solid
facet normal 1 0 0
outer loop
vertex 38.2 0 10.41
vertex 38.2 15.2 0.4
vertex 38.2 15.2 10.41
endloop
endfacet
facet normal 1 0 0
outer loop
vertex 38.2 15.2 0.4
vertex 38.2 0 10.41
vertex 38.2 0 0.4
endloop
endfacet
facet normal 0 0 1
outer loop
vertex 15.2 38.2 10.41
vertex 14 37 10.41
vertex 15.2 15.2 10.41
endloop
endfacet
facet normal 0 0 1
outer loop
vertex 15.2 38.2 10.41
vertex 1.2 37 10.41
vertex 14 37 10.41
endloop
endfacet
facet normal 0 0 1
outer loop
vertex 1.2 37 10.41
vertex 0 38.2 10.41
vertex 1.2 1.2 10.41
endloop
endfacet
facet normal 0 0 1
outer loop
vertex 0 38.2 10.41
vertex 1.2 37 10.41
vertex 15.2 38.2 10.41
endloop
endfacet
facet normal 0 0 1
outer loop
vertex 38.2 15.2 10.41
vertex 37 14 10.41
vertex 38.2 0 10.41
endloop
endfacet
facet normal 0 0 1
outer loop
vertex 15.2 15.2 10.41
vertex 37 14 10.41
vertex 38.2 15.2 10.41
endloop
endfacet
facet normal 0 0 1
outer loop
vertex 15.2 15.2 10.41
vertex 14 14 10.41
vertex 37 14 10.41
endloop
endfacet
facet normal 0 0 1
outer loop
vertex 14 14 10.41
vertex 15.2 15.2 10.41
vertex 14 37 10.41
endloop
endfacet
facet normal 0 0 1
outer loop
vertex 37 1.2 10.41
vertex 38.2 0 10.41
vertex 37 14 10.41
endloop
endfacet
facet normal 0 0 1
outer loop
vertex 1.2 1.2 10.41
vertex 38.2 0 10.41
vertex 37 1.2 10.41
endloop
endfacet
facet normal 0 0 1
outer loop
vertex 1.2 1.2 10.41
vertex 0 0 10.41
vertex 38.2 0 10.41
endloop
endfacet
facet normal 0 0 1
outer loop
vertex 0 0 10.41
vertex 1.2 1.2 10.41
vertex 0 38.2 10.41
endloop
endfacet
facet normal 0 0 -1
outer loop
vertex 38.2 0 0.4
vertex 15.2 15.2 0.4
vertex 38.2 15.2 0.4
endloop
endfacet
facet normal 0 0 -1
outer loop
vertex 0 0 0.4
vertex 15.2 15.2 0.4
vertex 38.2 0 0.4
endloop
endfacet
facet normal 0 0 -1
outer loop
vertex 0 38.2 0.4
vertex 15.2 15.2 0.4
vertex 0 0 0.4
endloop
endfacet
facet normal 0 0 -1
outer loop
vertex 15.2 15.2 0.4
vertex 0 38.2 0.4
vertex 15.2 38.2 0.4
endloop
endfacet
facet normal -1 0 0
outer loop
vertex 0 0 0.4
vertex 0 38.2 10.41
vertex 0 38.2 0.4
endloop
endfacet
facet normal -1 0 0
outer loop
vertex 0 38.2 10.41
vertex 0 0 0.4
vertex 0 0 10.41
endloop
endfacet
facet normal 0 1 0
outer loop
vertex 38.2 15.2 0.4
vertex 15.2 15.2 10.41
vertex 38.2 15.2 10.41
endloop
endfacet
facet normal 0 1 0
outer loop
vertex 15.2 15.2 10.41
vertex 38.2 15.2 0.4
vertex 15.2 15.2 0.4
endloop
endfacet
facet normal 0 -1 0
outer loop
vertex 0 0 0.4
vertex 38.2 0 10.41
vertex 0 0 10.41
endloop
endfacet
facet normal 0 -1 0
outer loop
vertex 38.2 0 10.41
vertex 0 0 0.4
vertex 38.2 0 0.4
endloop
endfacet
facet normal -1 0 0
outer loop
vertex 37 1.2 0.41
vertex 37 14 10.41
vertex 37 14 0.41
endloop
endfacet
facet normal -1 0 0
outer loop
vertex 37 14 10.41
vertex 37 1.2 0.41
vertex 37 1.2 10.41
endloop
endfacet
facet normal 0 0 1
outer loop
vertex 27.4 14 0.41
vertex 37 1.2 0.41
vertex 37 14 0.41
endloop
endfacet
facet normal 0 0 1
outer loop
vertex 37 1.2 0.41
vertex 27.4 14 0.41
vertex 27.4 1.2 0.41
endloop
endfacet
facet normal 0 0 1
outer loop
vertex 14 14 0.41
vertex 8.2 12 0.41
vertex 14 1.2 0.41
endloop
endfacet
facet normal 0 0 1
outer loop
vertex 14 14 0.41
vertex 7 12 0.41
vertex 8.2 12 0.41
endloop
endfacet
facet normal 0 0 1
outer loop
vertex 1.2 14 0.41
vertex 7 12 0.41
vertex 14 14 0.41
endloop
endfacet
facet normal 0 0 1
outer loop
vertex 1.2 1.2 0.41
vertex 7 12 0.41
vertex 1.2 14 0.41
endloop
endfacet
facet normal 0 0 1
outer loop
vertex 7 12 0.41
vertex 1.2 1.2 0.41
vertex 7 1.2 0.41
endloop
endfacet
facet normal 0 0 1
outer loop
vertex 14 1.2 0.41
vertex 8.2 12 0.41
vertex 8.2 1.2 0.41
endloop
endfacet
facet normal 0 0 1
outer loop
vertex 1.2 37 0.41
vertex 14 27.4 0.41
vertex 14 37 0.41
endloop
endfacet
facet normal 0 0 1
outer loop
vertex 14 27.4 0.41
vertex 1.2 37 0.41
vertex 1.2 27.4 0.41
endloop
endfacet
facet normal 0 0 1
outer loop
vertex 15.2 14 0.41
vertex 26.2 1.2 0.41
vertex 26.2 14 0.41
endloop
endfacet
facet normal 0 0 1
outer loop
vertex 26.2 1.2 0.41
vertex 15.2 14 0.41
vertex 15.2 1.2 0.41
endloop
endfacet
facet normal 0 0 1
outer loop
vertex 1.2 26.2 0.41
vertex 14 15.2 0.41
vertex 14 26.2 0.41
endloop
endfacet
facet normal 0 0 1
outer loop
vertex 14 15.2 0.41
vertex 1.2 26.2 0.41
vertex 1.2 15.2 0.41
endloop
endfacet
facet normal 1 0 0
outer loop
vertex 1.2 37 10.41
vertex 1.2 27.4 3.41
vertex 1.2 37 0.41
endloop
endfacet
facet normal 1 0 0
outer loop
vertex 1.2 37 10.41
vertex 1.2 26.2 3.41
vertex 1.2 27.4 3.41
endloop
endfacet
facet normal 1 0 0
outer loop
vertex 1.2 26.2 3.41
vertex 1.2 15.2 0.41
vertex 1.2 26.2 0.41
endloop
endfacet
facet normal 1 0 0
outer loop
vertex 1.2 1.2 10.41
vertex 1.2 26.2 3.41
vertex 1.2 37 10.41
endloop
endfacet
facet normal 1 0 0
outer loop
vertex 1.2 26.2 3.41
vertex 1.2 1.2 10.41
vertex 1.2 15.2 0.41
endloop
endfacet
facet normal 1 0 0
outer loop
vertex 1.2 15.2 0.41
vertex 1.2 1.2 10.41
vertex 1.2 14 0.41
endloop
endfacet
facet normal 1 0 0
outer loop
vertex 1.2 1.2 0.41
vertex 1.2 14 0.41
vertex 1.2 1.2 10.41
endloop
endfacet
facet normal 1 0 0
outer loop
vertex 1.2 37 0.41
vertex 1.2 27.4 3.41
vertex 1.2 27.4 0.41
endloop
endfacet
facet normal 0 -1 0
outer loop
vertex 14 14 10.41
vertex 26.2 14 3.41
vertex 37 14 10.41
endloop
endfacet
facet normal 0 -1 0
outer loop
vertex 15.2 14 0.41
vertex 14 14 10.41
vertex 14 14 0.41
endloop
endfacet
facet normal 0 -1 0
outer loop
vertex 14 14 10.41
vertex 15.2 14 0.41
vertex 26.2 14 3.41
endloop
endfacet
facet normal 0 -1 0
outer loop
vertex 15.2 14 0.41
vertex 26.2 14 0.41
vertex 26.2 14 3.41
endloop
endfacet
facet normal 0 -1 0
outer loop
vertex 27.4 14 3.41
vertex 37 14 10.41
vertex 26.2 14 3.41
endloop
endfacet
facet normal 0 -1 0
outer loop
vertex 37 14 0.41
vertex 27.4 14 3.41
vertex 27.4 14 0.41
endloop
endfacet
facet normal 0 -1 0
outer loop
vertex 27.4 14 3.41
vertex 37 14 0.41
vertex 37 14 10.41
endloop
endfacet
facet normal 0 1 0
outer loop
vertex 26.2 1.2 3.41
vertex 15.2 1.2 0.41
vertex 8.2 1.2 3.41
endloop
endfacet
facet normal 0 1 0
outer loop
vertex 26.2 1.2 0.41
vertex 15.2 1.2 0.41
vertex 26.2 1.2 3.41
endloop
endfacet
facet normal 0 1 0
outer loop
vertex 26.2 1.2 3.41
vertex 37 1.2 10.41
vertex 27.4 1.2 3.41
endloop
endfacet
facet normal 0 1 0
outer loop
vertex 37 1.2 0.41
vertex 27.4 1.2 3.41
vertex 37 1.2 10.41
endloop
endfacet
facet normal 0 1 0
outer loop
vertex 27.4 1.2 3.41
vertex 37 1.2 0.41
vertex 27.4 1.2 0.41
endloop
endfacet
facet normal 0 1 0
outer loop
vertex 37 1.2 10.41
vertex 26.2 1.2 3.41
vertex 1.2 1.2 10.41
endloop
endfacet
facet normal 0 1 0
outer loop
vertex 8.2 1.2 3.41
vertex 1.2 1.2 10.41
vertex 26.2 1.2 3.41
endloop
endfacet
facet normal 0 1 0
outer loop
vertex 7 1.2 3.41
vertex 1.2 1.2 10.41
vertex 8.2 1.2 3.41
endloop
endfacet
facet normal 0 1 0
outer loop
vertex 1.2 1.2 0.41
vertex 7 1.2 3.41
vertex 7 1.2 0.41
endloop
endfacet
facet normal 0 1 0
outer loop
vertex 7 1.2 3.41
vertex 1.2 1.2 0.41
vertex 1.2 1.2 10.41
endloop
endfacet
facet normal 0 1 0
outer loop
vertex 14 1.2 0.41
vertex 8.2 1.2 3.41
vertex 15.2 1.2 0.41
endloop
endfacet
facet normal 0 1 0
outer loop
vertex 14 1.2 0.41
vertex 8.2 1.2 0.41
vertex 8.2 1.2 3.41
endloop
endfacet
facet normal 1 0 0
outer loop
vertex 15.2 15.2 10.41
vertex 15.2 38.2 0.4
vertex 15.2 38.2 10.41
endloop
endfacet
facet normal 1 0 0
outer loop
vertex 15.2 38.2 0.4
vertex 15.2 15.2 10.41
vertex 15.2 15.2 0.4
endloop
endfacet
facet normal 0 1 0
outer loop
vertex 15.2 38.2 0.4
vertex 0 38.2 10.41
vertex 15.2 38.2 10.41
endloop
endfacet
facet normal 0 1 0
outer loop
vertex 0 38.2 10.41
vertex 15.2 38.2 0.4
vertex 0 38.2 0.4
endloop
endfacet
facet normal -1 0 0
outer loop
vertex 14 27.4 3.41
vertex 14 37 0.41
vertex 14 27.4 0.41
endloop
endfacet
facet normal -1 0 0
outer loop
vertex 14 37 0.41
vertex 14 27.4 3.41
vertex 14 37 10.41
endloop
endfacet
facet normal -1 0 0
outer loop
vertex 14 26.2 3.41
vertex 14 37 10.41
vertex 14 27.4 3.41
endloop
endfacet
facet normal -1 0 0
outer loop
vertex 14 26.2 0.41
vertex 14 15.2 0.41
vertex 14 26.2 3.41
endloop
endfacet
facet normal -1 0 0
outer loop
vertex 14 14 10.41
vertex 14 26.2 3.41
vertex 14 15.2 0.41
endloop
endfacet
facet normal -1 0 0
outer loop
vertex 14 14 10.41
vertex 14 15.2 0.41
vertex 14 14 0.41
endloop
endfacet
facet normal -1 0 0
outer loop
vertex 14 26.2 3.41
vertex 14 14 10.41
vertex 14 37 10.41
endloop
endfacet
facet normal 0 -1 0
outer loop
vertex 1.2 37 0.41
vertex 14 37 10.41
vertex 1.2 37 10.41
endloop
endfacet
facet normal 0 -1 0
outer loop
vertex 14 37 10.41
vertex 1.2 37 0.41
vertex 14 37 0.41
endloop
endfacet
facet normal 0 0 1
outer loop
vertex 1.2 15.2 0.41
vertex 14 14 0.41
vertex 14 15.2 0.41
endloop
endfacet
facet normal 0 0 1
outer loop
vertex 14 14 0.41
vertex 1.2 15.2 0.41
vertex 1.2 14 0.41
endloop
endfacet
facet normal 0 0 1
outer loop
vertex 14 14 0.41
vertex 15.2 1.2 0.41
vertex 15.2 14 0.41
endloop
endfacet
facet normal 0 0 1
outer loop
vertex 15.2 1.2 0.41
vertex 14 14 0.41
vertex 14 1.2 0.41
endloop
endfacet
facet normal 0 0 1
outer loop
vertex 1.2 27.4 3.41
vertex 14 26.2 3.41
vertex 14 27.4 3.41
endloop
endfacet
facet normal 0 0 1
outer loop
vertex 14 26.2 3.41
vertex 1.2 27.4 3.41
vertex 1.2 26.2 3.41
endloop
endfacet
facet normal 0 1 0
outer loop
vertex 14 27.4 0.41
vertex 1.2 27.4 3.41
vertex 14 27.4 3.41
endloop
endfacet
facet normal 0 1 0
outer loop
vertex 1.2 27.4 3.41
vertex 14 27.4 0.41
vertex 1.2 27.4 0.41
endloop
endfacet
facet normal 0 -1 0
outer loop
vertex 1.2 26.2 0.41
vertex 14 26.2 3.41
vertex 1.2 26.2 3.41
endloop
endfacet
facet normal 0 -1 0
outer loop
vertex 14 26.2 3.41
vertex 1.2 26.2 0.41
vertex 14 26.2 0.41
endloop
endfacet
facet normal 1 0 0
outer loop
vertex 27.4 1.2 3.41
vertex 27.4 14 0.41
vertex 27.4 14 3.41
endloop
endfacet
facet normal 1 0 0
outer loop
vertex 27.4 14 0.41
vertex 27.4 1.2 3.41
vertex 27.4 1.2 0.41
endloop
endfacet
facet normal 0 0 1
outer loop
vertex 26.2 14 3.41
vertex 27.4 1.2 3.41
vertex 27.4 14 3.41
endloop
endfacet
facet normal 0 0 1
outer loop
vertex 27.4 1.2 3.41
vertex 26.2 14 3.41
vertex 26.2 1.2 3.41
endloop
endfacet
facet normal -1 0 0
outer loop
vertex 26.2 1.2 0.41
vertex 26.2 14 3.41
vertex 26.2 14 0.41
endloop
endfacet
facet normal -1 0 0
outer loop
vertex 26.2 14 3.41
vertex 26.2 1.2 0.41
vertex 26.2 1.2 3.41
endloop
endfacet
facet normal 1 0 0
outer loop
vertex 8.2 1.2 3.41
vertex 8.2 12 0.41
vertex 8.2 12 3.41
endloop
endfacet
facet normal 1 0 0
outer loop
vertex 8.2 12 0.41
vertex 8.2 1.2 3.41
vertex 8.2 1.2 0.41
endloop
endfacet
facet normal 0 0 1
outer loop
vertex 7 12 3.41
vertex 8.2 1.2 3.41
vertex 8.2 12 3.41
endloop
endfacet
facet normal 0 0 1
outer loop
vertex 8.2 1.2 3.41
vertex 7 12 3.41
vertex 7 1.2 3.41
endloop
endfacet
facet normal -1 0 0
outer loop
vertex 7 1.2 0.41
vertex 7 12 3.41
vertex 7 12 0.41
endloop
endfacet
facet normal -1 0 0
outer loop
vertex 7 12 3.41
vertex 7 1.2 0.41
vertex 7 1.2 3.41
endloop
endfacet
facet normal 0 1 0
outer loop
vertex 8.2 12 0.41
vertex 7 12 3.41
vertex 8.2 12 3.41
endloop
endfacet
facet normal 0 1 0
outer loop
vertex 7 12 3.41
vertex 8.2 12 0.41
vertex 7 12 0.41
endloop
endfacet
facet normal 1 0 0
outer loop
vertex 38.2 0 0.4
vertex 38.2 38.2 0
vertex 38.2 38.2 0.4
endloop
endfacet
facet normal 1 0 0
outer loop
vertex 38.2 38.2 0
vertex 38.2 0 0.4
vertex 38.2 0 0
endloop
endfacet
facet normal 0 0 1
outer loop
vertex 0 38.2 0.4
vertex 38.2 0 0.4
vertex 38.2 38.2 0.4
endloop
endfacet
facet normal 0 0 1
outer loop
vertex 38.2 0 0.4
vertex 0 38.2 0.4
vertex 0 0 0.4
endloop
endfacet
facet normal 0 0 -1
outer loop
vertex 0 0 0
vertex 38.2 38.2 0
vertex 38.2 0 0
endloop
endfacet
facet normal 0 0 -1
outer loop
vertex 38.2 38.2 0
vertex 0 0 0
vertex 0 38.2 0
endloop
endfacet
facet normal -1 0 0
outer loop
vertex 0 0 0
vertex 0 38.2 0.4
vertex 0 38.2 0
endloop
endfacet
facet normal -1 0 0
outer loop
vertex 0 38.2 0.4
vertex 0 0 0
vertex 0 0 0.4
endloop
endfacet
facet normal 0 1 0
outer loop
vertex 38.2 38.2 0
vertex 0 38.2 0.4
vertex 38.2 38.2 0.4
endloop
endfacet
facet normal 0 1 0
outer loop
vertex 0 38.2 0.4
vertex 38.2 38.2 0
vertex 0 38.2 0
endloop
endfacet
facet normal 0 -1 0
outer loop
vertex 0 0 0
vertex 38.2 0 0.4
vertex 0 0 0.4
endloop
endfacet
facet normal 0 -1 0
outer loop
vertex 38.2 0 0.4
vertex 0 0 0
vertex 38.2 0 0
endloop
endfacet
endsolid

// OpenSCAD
// file: ../../Base/PlacementOptions.scad
// Fischertechnik Box Foundation
// Placement Options

// Alignment
NoAlign = 0;
AlignLeft = 1;
AlignBottom = 2;
AlignCenter = 3;
AlignRight = 4;
AlignTop = 5;

// Element rotation degree steps
rotations = [0, -90, -180, -270];

// Rotation
NoRotation = 0;
Rotate0 = 0;
Rotate90 = 1;
Rotate180 = 2;
Rotate270 = 3;

// Docking (seen from above)
NoDock = -1;
DockLeft = 0;
DockTop = 1;
DockRight = 2;
DockCorner = 2;
DockBottom = 3;

// Web corners
LowerLeft = 0;
UpperLeft = 1;
UpperRight = 2;
LowerRight = 3;

// Web position relative to corner
LeftOfCorner = 0;
RightOfCorner = 1;
// file: ../../Base/Boxes.scad
// Fischertechnik Box Foundation
// Pre-designed Boxes

use <Constants.scad>

include <PlacementOptions.scad>

box190Width = 190;
box190Depth = 130;
box130Width = 130;
box130Depth = 95;
boxUsageHeight = 33.9;
boxWallThickness = 2.4;
boxBaseThickness = 1.0;
boxWebWidth = 3.0;

// getBoxWallThickness()
// Gets the wall thickness of a Fischertechnik Box

function getBoxWallThickness() = boxWallThickness;

// Gets the usable height of a fischertechnik box
function getBoxUsageHeight() = boxUsageHeight;

// Gets the thickness of the Fischertechnik box base.
function getBoxBaseThickness() = boxBaseThickness;

// Gets the width of a box web
function getBoxWebWidth() = boxWebWidth;

// Gets the usable inner space of a Box 190 as an x/y-list
function getBox190Space() = [
    box190Width - 2*getBoxWallThickness(), 
    box190Depth - 2*getBoxWallThickness() ];

// Imports the Fischertechnik empty box 130x190 mm and places it at position 0,0
// 190x130 are the outer sizes, the inner space is slightly smaller. Use getBox190Space() to get the inner sizes.
// This module needs the STL file "Fischertechnik Box 130x190.stl" in the library path.
// The box is positioned that the usable inner space is at the 0,0,0 position. The

module Box190() {
    translate([-getBoxWallThickness(),-getBoxWallThickness(),-getBoxBaseThickness()])
        import("Fischertechnik Box 130x190.stl", convexity=3);
}

// Gets the usable inner space of a Box 130 as an x/y-list
function getBox130Space() = [
    box130Width - 2*getBoxWallThickness(), 
    box130Depth - 2*getBoxWallThickness() ];

// Imports the Fischertechnik empty box 95x130 mm and places it at position 0,0
// 190x130 are the outer sizes, the inner space is slightly smaller. Use getBox190Space() to get the inner sizes.
// This module needs the STL file "Fischertechnik Box 95x130.stl" in the library path.
// The box is positioned that the usable inner space is at the 0,0,0 position. The

module Box130() {
    translate([-getBoxWallThickness(),-getBoxWallThickness(),-getBoxBaseThickness()])
        import("Fischertechnik Box 95x130.stl", convexity=3);
}

// Creates a web at the specified box walls
// corner 0 = LowerLeft, 1 = UpperLeft, 2 = UpperRight, 3 = LowerRight
// side 0 = LeftOfCorner, 1 = RightOfCorner
// distance = Distance in mm from the corner
// box = inner width and depth of the box (default: Box 190)
// webWidth = length of the web (default is 3 mms)
// webThickness = thickness of the web (default is 1 mm)

module BoxWeb(corner, side, distance, box=getBox190Space(), webWidth=getBoxWebWidth(), webThickness=1.0) {
    sink = getBoxWallThickness()/2;

    width = (corner % 2 == 0) ? 
            (side == LeftOfCorner ? webWidth : webThickness) :
            (side == LeftOfCorner ? webThickness : webWidth);

    depth = (corner % 2 == 0) ? 
            (side == RightOfCorner ? webWidth : webThickness) :
            (side == RightOfCorner ? webThickness : webWidth);
    
    xDiff = corner == LowerLeft ? 
                (side == LeftOfCorner ? -sink : distance) :
            (corner == UpperLeft ?                
                (side == LeftOfCorner ? distance : -sink) :
            (corner == UpperRight ?
                (side == LeftOfCorner ? box.x-webWidth+sink : box.x-distance-webThickness) :
                (side == LeftOfCorner ? box.x-distance-webThickness: box.x-webWidth+sink)));

    yDiff = corner == LowerLeft ? 
                (side == RightOfCorner ? -sink : distance) :
            (corner == UpperLeft ?
                (side == RightOfCorner ? box.y-distance : box.y-webWidth+sink) :
            (corner == UpperRight ?
                (side == RightOfCorner ? box.y-webWidth+sink : box.y-distance) :
                (side == RightOfCorner ? distance : -sink)));
    
    translate([xDiff, yDiff, -getExcess()])
        cube([width, depth, boxUsageHeight + 2*getExcess()]);
}
// file: ../../Base/Rotation.scad
// Fischertechnik Box Foundation
// Geometry Helpers Rotation

include <PlacementOptions.scad>

// getRotatedSpace(space, rotation=NoRotation)
// Rotates the space dependent on the specified rotation

function getRotatedSpace(space, rotation=NoRotation) = [
    (rotation == Rotate90 || rotation == Rotate270) ? space.y : space.x,
    (rotation == Rotate90 || rotation == Rotate270) ? space.x : space.y
];

// Rotates the given space around the fixed left lower corner
// space = the space the children needs as width/depth list [width,depth]
// rotation = 0 Rotate0 degrees, 1 Rotate90 degrees, 2 Rotate180 degrees, 3 Rotate270 degrees (equivalent to -90)

module RotateFix(space, rotation=Rotate0) {
    dy = (rotation == Rotate0 || rotation == Rotate270) ? 0 :
        (rotation == Rotate90) ? space.x :
        space.y;
    dx = (rotation < Rotate180) ? 0 :
        (rotation == Rotate180) ? space.x :
        space.y;
    
    translate([dx, dy, 0])
        rotate([0, 0, rotations[rotation]])
            children();
}
// file: ../../Base/Alignment.scad
// Fischertechnik Box Foundation
// Geometry Helpers Alignment

include <PlacementOptions.scad>

// getAlignedX(elementWidth, spaceWidth, align=AlignRight, offset=0)
// Gets the aligned X offset of an element with the given
// width in the given space.
// elementWidth = The width of the element to positon
// spaceWidth = The space where the element should be aligned
// align = 0 AlignLeft, 1 AlignCenter, 2 AlignRight
// offset = an optional offset from the aligned position. When
// aligned left or centered, then positive values are in X direction.
// When aligned right then positive values are in negative X direction.

function getAlignedX(elementWidth, spaceWidth, align=AlignRight, offset=0) =
    (align == AlignLeft) ?
        offset :
        ((align == AlignCenter) ?
        (spaceWidth - elementWidth)/2 + offset :
        spaceWidth - offset - elementWidth);

// getAlignedY(elementDepth, spaceDepth, align=AlignTop, offset=0)
// Gets the aligned Y offset of an element with the given
// depth in the given space.
// elementDepth = The depth of the element to positon
// spaceDepth = The space where the element should be aligned
// align = 0 AlignBottom, 1 AlignCenter, 2 AlignTop
// offset = an optional offset from the aligned position. When
// aligned bottom or centered, then positive values are in Y direction.
// When aligned top then positive values are in negative Y direction.

function getAlignedY(elementDepth, spaceDepth, align=AlignTop, offset=0) =
    (align == AlignBottom) ?
        offset :
        ((align == AlignCenter) ?
        (spaceDepth - elementDepth)/2 + offset :
        spaceDepth - offset - elementDepth);
// file: ../../Base/Placement.scad
// Fischertechnik Box Foundation
// Geometry Helpers Placement

use <Constants.scad>
use <Alignment.scad>
use <Rotation.scad>
use <Boxes.scad>

include <PlacementOptions.scad>

// Place(x=0, y=0, elementSpace=[0,0], alignX=AlignLeft, alignY=AlignBottom, rotation=Rotate0, boxSpace=getBox190Space())
// Places the child at the specified position
// y = Y-Position. This is a relative position when an X aligment is specified.
// x = X-Position. This is a relative position when an Y aligment is specified.
// elementSpace = space of the element to be placed [x,y]
// alignX = -1=NoAlign, 0 AlignLeft, 1 AlignCenter, 3 AlignRight (elementSpace and boxSpace required!)
// alignY = -1=NoAlign, 2 AlignBottom, 1 AlignCenter, 4 AlignTop (elementSpace and boxSpace required!)
// rotation = 0 Rotate0 0 degrees, 1 Rotate90 90 degrees, 
// 2 Rotate180 180 degrees, 3 Rotate270 270 degrees (equivalent to -90)
// boxSpace = Inner space of the box where the placement occurs [x,y] - default is Box 190x130 inner space

module Place(x=0, y=0, elementSpace=[0,0], 
  alignX=AlignLeft, alignY=AlignBottom, 
  rotation=NoRotation, boxSpace=getBox190Space()) {

    module Position(x, y, space, rotation=Rotate0) {
        translate([x, y, 0])
            RotateFix(space, rotation)
                children();
    }

    space = getRotatedSpace(elementSpace, rotation);
    alignedX = getAlignedX(space.x, boxSpace.x, alignX, x);
    alignedY = getAlignedY(space.y, boxSpace.y, alignY, y);
    Position(alignedX, alignedY, elementSpace, rotation)
        children();
}

// Center(space=getBox130Space(), elementSpace=[0,0])
// space = Space where the children is centered. For cylinder use centered=true and no elementSpace.
// elementSpace = space of the element to be centered [x,y]

module Center(space=getBox190Space(), elementSpace=[0,0]) {
    translate([(space.x - elementSpace.x) / 2, (space.y - elementSpace.y) / 2])
        children(0);
}

// CenterHorizontal(width=0, y=0, offset=0, space=getBox130Space())
// space = Space where the children is centered. For cylinder use centered=true and no elementSpace.
// elementSpace = space of the element to be centered [x,y]

module CenterHorizontal(width=0, y=0, offset=0, space=getBox190Space()) {
    translate([(space.x - width) / 2 + offset, y])
        children(0);
}

// CenterVertical(depth=0, x=0, offset=0, space=getBox130Space())
// space = Space where the children is centered. For cylinder use centered=true and no elementSpace.
// elementSpace = space of the element to be centered [x,y]

module CenterVertical(depth=0, x=0, offset=0, space=getBox190Space()) {
    translate([x, (space.y - depth) / 2 + offset])
        children(0);
}
// file: ../../Elements/AxisClip10.scad
// Fischertechnik Box Library
// Axis for clip 10
// 31023

use <../ModelBase/Simple.scad>

width = 12;
depth = 12;
height = 23;

// getAxisClip10Space()
// Gets the space of a frame for a clip 10 with spring ring (mot2)

function getAxisClip10Space() = [width, depth, height];

// AxisClip10()
// Axis for clip 10 with spring ring (mot2)

module AxisClip10() {
    LeveledAxisWithSpace(height, height-10, getAxisClip10Space());
}

// Tests
color("lightgray")
AxisClip10();
// file: ../../Base/Constants.scad
// Fischertechnik Box Foundation
// Constants

// Constant values necessary for multiple elements

// Base constants
dividerThickness = 1.2;
excess = 0.01;
fragments = 90;
tolerance = 0.8;

// Gets the thickness of a divider 
function getDividerThickness() = dividerThickness;

// Gets the excess that is used to merge walls into each other
function getExcess() = excess;

// Gets amount of fragments of a cylinder
function getFragments() = fragments;

// Gets the inner tolerance of a frame to each side
function getTolerance() = tolerance;


// Fischertechnik specific constants
axisDiameter = 4;
axisBottomDiameter = axisDiameter + 1;
standardEdgeDistance = 2.5;
standardWebDistance = 11.5;
standardCornerLength = 15;
tubeWallFactor = 0.8;

// Gets axis diameter
function getAxisDiameter() = axisDiameter;

// Gets axis bottom diameter for thicker part at the bottom
function getAxisBottomDiameter() = axisBottomDiameter;

// gets the standard distance to the wall of the box for dockable frames with webs
function getStandardEdgeDistance() = standardEdgeDistance;

// gets the standard distance of each web to the corner of the dockable frame
function getStandardWebDistance() = standardWebDistance;

// gets the standard length of the corner walls of a dockable frame
function getStandardCornerLength() = standardCornerLength;

// gets the wall thickness of a tube.
function getTubeWallThickness() = tubeWallFactor * getDividerThickness();
// file: ../../Elements/FrameUniversalJointCardan.scad
// Fischertechnik Box Library
// Frame for universal joint cardan
// 31044

use <../Base/Constants.scad>
use <../Base/Placement.scad>
use <../ModelBase/Simple.scad>

width = 35;
depth = 12;
height = 10;

// getFrameUniversalJointCardanSpace()
// Gets the complete space of the universal joint cardan frame

function getFrameUniversalJointCardanSpace() = getAngledFrameOuterVolume(width, depth, width, depth, height);

// FrameUniversalJointCardan()
// Frame for a universal joint cardan (as mot1)

module FrameUniversalJointCardan() {
    AngledFrame(width, depth, width, depth, height);
    
    innerVolume = getFrameInnerVolume([width, depth, height]);
    
    webEndDistance = 12;
    webHeight = 3;
    Place(getDividerThickness() - getExcess(), getFrameUniversalJointCardanSpace().y - webEndDistance)
        Wall([innerVolume.y+2*getExcess(), getDividerThickness(), webHeight]);
    Place(getFrameUniversalJointCardanSpace().y - webEndDistance, getDividerThickness() - getExcess())
        Wall([getDividerThickness(), innerVolume.y+2*getExcess(), webHeight]);
    Place((innerVolume.y + getDividerThickness()) / 2, getDividerThickness() - getExcess())
        Wall([getDividerThickness(), innerVolume.y+getExcess() - 2, webHeight]);
}

// Test
color("lightgray")
FrameUniversalJointCardan();
// file: ../TestPrint.scad
// 3D Print Test Base

use <../Base/Constants.scad>

use <../Elements/AxisClip10.scad>

module TestPrint(elementSpace) {
    cube([elementSpace.x, elementSpace.y, 0.4]);
    translate([0,0,0.4+getExcess()]) {
        children();
    }
}

TestPrint(getAxisClip10Space())
    AxisClip10();
// main file
// 3D Print Test Base
// FrameUniversalJointCardan

use <../TestPrint.scad>
use <../../Elements/FrameUniversalJointCardan.scad>

TestPrint(getFrameUniversalJointCardanSpace())
    FrameUniversalJointCardan();
